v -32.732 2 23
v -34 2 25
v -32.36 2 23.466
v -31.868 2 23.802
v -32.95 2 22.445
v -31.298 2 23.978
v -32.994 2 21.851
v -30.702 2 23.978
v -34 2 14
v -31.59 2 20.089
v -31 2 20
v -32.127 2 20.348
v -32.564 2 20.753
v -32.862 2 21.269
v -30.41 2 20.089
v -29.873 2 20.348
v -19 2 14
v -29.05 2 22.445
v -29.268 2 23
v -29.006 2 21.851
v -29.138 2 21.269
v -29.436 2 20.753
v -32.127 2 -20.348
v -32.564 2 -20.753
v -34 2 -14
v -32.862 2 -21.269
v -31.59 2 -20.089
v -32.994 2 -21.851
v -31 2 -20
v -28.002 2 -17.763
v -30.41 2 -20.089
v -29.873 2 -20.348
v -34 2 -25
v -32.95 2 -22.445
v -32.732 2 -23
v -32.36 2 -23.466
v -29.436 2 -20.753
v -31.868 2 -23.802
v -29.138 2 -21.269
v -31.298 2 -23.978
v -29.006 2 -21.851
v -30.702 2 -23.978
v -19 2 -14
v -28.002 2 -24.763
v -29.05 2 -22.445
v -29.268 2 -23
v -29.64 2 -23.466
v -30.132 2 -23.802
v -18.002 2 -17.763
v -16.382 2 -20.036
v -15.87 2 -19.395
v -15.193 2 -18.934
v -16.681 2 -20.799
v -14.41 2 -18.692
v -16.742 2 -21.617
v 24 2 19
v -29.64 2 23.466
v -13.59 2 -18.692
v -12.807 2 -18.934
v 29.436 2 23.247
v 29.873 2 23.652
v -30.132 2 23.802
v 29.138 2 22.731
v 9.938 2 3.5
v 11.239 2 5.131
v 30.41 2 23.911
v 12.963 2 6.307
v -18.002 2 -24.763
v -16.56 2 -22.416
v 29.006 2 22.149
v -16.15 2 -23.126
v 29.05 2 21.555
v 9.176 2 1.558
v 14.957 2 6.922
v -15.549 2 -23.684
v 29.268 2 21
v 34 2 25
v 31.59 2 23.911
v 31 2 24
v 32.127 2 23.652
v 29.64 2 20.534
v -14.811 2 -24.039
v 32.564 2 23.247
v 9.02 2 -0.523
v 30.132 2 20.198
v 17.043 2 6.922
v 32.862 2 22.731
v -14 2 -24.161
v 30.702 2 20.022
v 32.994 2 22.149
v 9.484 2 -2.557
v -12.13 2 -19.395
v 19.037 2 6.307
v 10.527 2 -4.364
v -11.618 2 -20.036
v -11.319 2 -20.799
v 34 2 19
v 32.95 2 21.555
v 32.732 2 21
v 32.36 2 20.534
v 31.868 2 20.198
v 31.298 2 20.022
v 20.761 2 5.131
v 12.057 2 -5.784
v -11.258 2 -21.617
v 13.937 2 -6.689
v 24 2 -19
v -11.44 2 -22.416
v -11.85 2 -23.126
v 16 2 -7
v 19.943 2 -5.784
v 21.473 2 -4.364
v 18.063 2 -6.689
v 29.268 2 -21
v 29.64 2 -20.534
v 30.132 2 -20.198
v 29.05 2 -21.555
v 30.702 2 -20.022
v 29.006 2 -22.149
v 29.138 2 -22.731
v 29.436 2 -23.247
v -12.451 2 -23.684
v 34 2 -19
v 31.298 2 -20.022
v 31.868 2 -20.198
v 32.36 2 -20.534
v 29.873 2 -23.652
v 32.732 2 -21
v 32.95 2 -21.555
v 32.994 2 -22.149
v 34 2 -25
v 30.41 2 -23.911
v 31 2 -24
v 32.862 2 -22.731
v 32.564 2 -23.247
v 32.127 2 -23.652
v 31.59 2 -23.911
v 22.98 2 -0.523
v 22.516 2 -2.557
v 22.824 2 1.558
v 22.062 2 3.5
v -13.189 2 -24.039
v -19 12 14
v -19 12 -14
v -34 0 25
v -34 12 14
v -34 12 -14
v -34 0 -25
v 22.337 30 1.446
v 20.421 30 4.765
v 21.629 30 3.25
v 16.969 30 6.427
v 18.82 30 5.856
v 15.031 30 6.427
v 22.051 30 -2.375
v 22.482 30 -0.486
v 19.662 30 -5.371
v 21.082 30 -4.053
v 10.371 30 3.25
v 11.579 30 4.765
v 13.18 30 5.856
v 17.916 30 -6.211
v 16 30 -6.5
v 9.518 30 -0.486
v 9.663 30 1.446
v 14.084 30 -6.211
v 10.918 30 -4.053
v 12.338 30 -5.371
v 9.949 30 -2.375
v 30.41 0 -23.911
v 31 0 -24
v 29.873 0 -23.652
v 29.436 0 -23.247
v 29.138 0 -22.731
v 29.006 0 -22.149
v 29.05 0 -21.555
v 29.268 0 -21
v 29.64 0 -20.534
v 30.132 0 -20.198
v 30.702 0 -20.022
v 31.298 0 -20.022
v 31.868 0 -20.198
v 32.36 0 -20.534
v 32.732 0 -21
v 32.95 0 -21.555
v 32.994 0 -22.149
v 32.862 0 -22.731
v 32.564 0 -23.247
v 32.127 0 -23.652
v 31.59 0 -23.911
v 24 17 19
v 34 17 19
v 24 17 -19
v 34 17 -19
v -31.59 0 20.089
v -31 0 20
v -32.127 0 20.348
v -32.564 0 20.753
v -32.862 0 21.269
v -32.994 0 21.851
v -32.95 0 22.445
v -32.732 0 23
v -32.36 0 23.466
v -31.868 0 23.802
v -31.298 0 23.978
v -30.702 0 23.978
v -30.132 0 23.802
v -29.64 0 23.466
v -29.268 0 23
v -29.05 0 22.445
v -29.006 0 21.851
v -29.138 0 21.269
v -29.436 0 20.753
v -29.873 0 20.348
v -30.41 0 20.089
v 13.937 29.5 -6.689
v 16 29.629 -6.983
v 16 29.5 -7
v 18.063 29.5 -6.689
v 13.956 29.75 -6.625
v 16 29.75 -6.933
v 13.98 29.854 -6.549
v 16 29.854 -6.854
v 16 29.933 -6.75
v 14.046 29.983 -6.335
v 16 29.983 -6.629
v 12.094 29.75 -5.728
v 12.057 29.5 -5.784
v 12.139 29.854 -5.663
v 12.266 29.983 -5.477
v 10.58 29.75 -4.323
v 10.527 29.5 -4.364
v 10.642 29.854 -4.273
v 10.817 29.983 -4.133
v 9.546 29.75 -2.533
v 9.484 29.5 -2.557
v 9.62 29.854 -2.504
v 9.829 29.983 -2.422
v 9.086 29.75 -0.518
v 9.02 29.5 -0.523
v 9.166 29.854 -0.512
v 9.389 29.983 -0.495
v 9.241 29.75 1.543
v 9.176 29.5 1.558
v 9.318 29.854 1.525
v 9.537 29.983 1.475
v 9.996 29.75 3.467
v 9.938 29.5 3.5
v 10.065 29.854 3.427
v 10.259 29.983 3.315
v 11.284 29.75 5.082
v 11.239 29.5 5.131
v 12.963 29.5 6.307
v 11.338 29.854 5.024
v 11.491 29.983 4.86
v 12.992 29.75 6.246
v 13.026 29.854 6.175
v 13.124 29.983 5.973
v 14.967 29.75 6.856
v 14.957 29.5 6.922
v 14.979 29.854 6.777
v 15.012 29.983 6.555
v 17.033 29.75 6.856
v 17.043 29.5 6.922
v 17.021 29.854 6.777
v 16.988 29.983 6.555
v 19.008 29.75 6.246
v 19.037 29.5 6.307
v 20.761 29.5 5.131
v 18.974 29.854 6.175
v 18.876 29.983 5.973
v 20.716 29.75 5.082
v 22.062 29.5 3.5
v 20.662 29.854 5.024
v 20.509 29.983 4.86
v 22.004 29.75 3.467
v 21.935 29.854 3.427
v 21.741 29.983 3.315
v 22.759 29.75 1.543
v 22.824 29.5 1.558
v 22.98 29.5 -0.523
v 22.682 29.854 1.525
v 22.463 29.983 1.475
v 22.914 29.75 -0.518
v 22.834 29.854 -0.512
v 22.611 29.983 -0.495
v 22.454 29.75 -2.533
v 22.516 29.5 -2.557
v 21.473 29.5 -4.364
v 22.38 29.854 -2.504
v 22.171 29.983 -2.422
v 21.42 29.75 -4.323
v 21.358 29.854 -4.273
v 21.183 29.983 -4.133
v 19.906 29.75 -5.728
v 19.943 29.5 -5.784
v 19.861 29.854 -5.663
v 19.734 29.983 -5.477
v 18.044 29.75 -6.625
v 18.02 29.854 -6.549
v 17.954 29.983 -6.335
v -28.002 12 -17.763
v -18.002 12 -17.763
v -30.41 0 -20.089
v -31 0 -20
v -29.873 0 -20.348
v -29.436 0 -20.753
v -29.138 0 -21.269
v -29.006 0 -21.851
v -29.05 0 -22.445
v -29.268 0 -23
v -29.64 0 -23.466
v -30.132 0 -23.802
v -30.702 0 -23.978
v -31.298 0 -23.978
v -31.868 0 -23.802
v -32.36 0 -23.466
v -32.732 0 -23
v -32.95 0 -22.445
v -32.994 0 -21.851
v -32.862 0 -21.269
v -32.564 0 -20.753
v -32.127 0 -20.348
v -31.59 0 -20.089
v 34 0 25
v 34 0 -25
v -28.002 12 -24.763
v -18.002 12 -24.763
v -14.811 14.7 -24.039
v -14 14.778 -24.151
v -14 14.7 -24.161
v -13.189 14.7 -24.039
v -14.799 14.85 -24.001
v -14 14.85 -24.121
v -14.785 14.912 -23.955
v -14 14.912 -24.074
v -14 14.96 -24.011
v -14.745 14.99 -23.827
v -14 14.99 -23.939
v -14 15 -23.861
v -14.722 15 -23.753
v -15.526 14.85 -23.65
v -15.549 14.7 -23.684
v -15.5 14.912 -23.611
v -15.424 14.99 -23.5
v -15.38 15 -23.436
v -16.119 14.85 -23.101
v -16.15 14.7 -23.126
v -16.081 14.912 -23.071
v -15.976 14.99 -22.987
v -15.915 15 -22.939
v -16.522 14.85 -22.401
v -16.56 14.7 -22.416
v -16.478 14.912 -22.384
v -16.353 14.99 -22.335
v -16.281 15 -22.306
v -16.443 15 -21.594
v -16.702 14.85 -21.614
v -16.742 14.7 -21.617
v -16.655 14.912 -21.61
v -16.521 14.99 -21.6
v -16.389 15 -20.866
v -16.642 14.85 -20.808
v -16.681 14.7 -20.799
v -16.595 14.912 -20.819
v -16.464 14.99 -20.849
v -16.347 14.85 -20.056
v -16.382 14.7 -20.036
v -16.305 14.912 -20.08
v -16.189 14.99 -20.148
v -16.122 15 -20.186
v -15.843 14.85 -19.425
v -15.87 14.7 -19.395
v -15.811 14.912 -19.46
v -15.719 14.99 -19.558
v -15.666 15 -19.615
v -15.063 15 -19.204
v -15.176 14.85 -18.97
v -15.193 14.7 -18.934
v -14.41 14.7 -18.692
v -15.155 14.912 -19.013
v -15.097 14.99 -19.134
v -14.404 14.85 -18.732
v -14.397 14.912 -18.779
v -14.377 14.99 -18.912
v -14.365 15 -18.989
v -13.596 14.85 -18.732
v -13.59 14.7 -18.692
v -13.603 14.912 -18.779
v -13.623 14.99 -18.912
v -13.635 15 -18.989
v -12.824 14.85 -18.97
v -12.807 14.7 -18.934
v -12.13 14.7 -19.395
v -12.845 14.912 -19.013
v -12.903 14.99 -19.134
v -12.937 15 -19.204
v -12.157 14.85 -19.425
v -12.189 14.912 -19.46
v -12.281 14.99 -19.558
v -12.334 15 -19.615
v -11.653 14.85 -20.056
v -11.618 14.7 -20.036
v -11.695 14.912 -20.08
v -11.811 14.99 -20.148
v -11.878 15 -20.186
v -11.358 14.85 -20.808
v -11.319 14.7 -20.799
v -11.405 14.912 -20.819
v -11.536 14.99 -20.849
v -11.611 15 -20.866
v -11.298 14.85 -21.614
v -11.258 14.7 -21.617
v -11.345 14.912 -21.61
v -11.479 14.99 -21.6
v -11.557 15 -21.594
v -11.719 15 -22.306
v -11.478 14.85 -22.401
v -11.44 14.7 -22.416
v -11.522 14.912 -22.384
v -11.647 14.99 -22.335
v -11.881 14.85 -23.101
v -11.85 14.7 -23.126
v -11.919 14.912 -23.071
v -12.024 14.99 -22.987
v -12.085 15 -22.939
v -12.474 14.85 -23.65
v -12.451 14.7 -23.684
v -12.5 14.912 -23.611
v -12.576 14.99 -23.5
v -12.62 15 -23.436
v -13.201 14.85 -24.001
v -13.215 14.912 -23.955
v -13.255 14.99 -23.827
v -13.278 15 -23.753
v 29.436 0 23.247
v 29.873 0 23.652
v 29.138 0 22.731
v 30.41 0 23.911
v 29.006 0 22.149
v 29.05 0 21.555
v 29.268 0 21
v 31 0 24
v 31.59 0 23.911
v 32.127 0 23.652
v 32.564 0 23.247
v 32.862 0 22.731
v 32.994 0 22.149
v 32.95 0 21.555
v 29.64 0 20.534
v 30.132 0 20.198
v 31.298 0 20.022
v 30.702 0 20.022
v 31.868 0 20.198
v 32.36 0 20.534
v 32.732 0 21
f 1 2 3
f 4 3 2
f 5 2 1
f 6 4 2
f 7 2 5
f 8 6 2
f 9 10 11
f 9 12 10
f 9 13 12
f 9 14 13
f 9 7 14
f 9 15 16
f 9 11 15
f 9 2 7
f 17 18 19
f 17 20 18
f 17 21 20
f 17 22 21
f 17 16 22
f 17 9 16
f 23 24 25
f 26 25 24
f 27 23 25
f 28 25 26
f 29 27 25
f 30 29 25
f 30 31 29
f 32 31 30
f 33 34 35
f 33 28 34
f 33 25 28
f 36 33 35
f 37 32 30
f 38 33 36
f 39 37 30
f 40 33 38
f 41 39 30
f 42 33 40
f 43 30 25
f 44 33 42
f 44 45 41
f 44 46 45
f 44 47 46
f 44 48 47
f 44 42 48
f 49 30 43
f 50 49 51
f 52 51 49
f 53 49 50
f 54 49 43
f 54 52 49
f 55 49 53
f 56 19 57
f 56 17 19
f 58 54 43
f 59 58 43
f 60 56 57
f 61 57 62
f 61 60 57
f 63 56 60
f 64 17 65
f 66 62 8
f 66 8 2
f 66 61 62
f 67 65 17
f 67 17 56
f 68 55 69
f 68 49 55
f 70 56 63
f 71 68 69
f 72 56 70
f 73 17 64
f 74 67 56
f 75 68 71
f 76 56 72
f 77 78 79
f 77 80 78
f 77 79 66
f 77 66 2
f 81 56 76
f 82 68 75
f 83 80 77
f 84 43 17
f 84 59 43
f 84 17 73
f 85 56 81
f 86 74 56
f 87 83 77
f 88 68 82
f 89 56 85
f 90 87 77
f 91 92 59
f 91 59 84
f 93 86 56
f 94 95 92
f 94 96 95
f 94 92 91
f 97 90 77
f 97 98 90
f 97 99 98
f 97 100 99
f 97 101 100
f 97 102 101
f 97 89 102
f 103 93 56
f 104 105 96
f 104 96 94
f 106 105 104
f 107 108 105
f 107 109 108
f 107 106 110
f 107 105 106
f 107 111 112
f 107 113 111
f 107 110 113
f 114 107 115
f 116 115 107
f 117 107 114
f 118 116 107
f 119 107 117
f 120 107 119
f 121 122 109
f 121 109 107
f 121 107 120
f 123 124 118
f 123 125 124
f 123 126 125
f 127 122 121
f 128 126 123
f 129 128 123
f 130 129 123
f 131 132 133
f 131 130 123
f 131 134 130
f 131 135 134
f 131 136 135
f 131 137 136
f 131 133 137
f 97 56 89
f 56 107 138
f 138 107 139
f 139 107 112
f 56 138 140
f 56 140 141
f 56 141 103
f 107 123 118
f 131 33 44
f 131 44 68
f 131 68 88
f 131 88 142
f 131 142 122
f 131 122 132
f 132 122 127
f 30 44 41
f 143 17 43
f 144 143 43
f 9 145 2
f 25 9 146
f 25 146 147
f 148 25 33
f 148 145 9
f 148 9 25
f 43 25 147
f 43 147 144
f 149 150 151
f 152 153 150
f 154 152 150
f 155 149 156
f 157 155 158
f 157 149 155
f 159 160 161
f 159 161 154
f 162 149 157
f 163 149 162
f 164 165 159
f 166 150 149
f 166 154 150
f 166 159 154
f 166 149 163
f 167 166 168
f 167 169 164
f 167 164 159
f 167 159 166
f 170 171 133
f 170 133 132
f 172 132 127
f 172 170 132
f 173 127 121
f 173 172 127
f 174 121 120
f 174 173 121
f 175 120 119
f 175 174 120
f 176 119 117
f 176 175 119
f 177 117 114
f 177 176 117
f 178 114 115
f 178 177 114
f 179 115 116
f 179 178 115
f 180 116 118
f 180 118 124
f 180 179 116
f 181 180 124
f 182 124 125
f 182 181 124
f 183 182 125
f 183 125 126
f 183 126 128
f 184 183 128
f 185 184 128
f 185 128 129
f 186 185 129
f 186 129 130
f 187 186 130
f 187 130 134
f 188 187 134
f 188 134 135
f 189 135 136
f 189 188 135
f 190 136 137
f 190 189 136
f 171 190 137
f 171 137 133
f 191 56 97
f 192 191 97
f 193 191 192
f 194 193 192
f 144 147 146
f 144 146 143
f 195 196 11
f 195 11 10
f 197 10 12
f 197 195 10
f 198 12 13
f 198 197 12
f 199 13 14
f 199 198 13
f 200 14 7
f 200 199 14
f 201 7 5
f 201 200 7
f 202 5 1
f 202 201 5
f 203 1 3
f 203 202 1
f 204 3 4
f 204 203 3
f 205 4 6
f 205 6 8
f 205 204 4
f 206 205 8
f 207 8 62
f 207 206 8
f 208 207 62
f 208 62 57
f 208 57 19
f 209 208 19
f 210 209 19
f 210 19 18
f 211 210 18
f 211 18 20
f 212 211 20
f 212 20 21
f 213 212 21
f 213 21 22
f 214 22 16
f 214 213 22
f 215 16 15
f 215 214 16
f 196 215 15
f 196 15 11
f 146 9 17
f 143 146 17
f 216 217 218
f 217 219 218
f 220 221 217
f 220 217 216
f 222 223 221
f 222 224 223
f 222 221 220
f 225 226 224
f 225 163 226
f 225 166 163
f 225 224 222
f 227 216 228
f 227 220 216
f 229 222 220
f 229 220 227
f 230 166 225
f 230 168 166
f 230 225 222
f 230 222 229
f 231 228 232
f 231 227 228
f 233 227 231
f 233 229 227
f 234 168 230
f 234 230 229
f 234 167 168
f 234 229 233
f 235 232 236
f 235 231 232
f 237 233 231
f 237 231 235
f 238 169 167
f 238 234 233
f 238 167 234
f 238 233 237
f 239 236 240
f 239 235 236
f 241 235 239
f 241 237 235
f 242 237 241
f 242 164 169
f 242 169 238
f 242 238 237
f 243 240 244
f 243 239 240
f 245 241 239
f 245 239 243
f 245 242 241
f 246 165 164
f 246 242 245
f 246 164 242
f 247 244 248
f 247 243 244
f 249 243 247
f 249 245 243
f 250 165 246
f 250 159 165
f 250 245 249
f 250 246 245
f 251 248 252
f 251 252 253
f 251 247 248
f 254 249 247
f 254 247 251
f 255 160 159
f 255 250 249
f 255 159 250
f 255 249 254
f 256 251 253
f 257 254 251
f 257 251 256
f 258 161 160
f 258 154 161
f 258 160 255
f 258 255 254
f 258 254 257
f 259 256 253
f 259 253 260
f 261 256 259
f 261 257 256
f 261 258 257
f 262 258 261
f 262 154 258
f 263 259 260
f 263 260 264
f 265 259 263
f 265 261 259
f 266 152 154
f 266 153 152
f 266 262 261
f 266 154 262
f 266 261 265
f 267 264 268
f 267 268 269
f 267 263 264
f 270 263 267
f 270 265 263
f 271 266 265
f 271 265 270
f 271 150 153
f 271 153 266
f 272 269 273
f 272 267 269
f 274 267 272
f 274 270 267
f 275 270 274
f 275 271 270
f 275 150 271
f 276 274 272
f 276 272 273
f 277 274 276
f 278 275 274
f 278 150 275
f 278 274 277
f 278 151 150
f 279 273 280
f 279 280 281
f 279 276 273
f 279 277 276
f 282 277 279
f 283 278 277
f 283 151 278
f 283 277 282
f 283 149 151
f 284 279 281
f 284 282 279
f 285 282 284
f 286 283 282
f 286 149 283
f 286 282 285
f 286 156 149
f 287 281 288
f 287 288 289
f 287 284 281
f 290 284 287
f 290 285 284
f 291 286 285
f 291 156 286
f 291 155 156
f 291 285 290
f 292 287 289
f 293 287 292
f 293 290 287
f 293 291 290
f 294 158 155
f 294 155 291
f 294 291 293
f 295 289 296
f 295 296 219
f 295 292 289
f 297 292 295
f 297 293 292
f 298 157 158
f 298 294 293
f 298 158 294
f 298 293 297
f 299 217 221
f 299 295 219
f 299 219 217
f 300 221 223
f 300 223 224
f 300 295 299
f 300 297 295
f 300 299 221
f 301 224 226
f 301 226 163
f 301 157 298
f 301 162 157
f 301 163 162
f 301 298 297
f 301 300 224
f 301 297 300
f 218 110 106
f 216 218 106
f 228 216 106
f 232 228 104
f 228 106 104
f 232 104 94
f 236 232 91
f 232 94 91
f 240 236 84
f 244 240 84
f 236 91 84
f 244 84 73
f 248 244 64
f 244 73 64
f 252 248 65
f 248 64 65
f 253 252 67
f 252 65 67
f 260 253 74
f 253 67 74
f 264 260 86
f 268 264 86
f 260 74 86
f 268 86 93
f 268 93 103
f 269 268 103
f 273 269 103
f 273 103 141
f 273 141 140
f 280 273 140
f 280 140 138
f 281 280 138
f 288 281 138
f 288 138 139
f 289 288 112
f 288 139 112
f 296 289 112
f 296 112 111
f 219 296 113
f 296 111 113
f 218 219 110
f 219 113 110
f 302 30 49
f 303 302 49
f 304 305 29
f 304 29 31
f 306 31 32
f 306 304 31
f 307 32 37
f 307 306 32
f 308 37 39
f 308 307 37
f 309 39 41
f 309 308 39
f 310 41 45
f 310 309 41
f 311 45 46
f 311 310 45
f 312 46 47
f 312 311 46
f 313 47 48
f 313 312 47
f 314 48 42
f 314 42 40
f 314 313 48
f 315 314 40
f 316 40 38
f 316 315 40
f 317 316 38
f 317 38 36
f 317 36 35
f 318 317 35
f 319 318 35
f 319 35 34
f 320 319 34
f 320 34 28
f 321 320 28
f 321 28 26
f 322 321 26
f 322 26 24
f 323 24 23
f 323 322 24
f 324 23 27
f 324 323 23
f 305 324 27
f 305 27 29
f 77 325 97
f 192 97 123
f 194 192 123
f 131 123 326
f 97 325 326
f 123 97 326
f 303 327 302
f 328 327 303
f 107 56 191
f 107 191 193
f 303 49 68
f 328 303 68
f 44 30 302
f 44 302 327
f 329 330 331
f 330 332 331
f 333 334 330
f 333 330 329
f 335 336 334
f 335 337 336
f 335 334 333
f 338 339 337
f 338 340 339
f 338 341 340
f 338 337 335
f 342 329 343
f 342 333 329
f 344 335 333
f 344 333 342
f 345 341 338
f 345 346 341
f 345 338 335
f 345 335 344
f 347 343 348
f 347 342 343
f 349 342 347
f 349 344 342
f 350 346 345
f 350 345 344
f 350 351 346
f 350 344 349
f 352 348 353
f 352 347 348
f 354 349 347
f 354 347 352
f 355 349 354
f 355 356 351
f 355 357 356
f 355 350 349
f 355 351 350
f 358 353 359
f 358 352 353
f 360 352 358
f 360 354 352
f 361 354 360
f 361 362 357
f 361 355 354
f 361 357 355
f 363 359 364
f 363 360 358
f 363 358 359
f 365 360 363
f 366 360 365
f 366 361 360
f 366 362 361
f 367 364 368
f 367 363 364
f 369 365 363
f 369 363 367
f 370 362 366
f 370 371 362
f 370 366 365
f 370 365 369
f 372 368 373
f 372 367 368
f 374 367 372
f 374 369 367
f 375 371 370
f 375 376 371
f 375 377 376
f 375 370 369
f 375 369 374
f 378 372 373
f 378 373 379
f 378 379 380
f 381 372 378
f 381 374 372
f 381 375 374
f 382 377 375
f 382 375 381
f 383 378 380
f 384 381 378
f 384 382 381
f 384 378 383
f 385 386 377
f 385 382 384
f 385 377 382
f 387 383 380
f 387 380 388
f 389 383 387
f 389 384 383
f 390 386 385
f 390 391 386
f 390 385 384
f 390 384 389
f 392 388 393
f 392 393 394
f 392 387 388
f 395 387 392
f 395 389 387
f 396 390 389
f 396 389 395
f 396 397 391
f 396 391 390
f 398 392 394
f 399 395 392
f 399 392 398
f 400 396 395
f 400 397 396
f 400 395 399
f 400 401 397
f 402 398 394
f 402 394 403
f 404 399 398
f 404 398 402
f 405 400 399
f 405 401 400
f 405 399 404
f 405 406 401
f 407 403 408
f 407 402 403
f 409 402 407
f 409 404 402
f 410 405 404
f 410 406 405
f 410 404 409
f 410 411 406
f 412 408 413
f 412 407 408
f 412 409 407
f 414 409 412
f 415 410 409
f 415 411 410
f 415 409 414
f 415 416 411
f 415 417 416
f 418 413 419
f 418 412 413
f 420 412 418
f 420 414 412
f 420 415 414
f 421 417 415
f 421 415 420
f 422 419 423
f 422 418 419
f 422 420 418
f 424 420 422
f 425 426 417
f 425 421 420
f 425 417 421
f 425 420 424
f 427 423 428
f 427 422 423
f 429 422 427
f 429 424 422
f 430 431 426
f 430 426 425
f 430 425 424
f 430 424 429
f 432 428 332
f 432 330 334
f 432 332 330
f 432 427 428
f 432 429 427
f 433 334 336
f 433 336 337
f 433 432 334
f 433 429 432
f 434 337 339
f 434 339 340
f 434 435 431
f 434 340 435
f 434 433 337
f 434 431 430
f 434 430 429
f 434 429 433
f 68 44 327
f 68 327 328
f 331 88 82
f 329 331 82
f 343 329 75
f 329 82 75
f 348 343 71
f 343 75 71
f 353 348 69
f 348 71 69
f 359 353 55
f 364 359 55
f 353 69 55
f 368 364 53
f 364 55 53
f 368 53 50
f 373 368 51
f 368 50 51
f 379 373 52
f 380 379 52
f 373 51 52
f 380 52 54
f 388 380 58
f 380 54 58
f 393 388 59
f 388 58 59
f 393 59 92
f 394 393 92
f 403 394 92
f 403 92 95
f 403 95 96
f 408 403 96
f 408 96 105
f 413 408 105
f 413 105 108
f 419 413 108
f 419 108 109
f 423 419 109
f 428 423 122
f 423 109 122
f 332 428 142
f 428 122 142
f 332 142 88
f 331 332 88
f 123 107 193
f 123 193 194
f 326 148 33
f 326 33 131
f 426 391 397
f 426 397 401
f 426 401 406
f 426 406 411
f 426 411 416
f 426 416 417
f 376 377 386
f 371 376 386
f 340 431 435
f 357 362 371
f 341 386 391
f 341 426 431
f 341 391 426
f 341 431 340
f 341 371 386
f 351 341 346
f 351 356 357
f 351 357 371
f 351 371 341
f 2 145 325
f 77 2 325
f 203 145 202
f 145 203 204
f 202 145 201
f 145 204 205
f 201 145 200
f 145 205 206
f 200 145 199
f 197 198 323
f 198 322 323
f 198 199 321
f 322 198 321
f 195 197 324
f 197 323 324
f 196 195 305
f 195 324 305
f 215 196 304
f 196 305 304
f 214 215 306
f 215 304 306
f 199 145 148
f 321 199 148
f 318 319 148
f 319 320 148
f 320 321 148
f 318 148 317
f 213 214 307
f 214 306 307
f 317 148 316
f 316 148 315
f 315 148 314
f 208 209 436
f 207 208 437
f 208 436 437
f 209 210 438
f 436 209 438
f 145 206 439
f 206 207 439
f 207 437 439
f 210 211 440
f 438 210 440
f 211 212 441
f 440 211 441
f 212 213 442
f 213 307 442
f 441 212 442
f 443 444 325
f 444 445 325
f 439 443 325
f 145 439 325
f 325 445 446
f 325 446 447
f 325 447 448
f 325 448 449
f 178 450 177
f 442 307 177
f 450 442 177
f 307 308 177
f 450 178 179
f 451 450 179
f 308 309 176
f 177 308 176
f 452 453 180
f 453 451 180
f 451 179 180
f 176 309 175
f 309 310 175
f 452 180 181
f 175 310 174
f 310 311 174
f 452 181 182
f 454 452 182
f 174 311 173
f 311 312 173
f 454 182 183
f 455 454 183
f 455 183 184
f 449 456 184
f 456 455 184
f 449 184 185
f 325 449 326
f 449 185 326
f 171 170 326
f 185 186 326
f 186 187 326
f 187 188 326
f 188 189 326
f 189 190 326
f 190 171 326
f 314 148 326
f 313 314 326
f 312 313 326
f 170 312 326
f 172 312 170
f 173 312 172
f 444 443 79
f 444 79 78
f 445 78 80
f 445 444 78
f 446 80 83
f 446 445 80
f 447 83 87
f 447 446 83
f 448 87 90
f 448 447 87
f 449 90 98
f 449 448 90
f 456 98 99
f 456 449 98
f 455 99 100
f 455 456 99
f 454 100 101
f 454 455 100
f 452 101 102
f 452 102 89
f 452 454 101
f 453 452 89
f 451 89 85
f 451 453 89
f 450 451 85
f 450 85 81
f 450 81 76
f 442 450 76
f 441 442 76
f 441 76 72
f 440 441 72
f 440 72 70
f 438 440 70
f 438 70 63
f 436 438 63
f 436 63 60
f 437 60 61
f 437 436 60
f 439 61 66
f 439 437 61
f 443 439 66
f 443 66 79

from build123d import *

# Parameters (mm, degrees)
SKETCH1_W           = 68
SKETCH1_H           = 50
SKETCH1_R           = 2
BOSS_EXTRUDE2_DEPTH = 2
SKETCH2_R           = 7
BOSS_EXTRUDE3_DEPTH = 28
FILLET1_R           = 0.5
SKETCH3_W           = 10
SKETCH3_H           = 38
BOSS_EXTRUDE4_DEPTH = 15
SKETCH4_W           = 15
SKETCH4_H           = 28
BOSS_EXTRUDE5_DEPTH = 10
SKETCH5_W           = 10
SKETCH5_H           = 7
BOSS_EXTRUDE6_DEPTH = 10
SKETCH6_R           = 2.75
BOSS_EXTRUDE7_DEPTH = 13
FILLET2_R           = 0.3


with BuildPart() as part:
    # Sketch1 → Boss-Extrude2 (new body)
    with BuildSketch(Plane(origin=(0, 0, 0), x_dir=(1, 0, 0), z_dir=(0, 1, 0))):
        Rectangle(SKETCH1_W, SKETCH1_H)
        with Locations(Location((-31, 22, 0), (0, 0, 270))):
            Circle(SKETCH1_R, mode=Mode.SUBTRACT)
        with Locations(Location((31, 22, 0), (0, 0, 90))):
            Circle(SKETCH1_R, mode=Mode.SUBTRACT)
        with Locations(Location((31, -22, 0), (0, 0, 270))):
            Circle(SKETCH1_R, mode=Mode.SUBTRACT)
        with Locations(Location((-31, -22, 0), (0, 0, 90))):
            Circle(SKETCH1_R, mode=Mode.SUBTRACT)
    extrude(amount=BOSS_EXTRUDE2_DEPTH)

    # Sketch2 → Boss-Extrude3 (add)
    with BuildSketch(Plane(origin=(0, 2, 0), x_dir=(1, 0, 0), z_dir=(0, 1, 0))):
        with Locations(Location((16, 0, 0), (0, 0, 90))):
            Circle(SKETCH2_R)
    extrude(amount=BOSS_EXTRUDE3_DEPTH)

    # Fillet1
    fillet1_edges = [part.edges().sort_by_distance(p)[0] for p in [
        (16, 30, 7),
    ]]
    fillet(fillet1_edges, radius=FILLET1_R)

    # Sketch3 → Boss-Extrude4 (add)
    with BuildSketch(Plane(origin=(0, 2, 0), x_dir=(1, 0, 0), z_dir=(0, 1, 0))):
        with Locations((29, 0)):
            Rectangle(SKETCH3_W, SKETCH3_H)
    extrude(amount=BOSS_EXTRUDE4_DEPTH)

    # Sketch4 → Boss-Extrude5 (add)
    with BuildSketch(Plane(origin=(0, 2, 0), x_dir=(1, 0, 0), z_dir=(0, 1, 0))):
        with Locations((-26.5, 0)):
            Rectangle(SKETCH4_W, SKETCH4_H)
    extrude(amount=BOSS_EXTRUDE5_DEPTH)

    # Sketch5 → Boss-Extrude6 (add)
    with BuildSketch(Plane(origin=(0, 2, 0), x_dir=(1, 0, 0), z_dir=(0, 1, 0))):
        with Locations((-23.001541076, 21.262939999)):
            Rectangle(SKETCH5_W, SKETCH5_H)
    extrude(amount=BOSS_EXTRUDE6_DEPTH)

    # Sketch6 → Boss-Extrude7 (add)
    with BuildSketch(Plane(origin=(0, 2, 0), x_dir=(1, 0, 0), z_dir=(0, 1, 0))):
        with Locations(Location((-14, 21.411376653, 0), (0, 0, 90))):
            Circle(SKETCH6_R)
    extrude(amount=BOSS_EXTRUDE7_DEPTH)

    # Fillet2
    fillet2_edges = [part.edges().sort_by_distance(p)[0] for p in [
        (-14, 15, -18.661376653),
    ]]
    fillet(fillet2_edges, radius=FILLET2_R)


solid = part.part
